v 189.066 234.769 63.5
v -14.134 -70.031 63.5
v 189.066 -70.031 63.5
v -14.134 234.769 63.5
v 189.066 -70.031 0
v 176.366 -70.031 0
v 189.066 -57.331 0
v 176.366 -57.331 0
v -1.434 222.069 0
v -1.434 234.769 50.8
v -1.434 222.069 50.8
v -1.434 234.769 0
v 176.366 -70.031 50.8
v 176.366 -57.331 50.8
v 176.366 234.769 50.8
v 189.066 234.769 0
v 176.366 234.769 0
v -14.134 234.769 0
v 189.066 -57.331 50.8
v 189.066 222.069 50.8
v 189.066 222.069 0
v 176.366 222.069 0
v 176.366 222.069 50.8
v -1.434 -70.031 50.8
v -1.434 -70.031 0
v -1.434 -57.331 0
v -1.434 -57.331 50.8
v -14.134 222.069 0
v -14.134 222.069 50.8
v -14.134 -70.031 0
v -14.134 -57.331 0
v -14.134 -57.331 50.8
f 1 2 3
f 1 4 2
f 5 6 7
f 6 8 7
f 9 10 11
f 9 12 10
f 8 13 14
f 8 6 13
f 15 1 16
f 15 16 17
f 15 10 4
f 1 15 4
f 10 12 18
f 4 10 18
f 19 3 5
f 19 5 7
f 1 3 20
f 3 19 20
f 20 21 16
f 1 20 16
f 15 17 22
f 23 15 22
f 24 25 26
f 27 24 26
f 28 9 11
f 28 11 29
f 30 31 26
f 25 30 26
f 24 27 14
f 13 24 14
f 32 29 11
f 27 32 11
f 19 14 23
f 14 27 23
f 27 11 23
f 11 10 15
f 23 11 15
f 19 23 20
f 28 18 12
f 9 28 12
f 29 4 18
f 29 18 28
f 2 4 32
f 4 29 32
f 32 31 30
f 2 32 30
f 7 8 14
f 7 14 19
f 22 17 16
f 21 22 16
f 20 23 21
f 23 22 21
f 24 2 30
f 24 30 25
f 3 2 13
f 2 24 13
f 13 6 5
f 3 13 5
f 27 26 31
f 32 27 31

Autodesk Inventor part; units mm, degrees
ref_plane "YZ Plane" through (0, 0, 0) normal (1, 0, 0) x (0, 1, 0)
ref_plane "XZ Plane" through (0, 0, 0) normal (0, 1, 0) x (-1, 0, 0)
ref_plane "XY Plane" through (0, 0, 0) normal (0, 0, 1) x (1, 0, 0)
sketch "Sketch1" plane through (0, 0, 0) normal (0, 0, 1) x (1, 0, 0)
  ellipse E0 centre (87.4656, 123.4744) end of major axis (87.4656, -181.3256) minor radius 228.6 projected
  line L0 (189.0656, 234.7689) -> (176.3656, 234.7689)
  line L1 (176.3656, 234.7689) -> (176.3656, 222.0689)
  line L2 (176.3656, 222.0689) -> (189.0656, 222.0689)
  line L3 (189.0656, 222.0689) -> (189.0656, 234.7689)
  line L4 (-14.1344, 234.7689) -> (-1.4344, 234.7689)
  line L5 (-1.4344, 234.7689) -> (-1.4344, 222.0689)
  line L6 (-1.4344, 222.0689) -> (-14.1344, 222.0689)
  line L7 (-14.1344, 222.0689) -> (-14.1344, 234.7689)
  line L8 (189.0656, -70.0311) -> (176.3656, -70.0311)
  line L9 (176.3656, -70.0311) -> (176.3656, -57.3311)
  line L10 (176.3656, -57.3311) -> (189.0656, -57.3311)
  line L11 (189.0656, -57.3311) -> (189.0656, -70.0311)
  line L12 (-14.1344, -70.0311) -> (-1.4344, -70.0311)
  line L13 (-1.4344, -70.0311) -> (-1.4344, -57.3311)
  line L14 (-1.4344, -57.3311) -> (-14.1344, -57.3311)
  line L15 (-14.1344, -57.3311) -> (-14.1344, -70.0311)
  line L16 (75.0457, -66.5884) -> (75.0457, -5.6676) projected
  line L17 (75.0457, -5.6676) -> (100.4457, -5.6676) projected
  line L18 (100.4457, -5.6676) -> (100.4457, -66.5884) projected
  line L19 (100.4457, -66.5884) -> (75.0457, -66.5884) projected
  circle A0 centre (87.4656, 239.7517) radius 30.4 projected
  point P0 (0, 0)
  dimension "d2" = 203.2
  dimension "d3" = 12.7
  dimension "d4" = 12.7
  dimension "d5" = 12.7
  dimension "d6" = 12.7
  dimension "d7" = 12.7
extrude "Extrusion1" add sketch "Sketch1" along normal blind 50.8 contours L3 L2 L1 L0 | L4 L5 L6 L7 | L8 L9 L10 L11 | L15 L14 L13 L12
sketch "Sketch2" plane through (0, 0, 50.8) normal (0, 0, 1) x (1, 0, 0)
  line L0 (189.0656, 222.0689) -> (189.0656, 234.7689) projected
  line L1 (-14.1344, -70.0311) -> (-1.4344, -70.0311) projected
  line L2 (189.0656, 234.7689) -> (-14.1344, 234.7689)
  line L3 (-14.1344, 234.7689) -> (-14.1344, -70.0311)
  line L4 (-14.1344, -70.0311) -> (189.0656, -70.0311)
  line L5 (189.0656, -70.0311) -> (189.0656, 234.7689)
  point P0 (0, 0)
extrude "Extrusion2" add sketch "Sketch2" along normal blind 12.7
properties part number "base_table"
